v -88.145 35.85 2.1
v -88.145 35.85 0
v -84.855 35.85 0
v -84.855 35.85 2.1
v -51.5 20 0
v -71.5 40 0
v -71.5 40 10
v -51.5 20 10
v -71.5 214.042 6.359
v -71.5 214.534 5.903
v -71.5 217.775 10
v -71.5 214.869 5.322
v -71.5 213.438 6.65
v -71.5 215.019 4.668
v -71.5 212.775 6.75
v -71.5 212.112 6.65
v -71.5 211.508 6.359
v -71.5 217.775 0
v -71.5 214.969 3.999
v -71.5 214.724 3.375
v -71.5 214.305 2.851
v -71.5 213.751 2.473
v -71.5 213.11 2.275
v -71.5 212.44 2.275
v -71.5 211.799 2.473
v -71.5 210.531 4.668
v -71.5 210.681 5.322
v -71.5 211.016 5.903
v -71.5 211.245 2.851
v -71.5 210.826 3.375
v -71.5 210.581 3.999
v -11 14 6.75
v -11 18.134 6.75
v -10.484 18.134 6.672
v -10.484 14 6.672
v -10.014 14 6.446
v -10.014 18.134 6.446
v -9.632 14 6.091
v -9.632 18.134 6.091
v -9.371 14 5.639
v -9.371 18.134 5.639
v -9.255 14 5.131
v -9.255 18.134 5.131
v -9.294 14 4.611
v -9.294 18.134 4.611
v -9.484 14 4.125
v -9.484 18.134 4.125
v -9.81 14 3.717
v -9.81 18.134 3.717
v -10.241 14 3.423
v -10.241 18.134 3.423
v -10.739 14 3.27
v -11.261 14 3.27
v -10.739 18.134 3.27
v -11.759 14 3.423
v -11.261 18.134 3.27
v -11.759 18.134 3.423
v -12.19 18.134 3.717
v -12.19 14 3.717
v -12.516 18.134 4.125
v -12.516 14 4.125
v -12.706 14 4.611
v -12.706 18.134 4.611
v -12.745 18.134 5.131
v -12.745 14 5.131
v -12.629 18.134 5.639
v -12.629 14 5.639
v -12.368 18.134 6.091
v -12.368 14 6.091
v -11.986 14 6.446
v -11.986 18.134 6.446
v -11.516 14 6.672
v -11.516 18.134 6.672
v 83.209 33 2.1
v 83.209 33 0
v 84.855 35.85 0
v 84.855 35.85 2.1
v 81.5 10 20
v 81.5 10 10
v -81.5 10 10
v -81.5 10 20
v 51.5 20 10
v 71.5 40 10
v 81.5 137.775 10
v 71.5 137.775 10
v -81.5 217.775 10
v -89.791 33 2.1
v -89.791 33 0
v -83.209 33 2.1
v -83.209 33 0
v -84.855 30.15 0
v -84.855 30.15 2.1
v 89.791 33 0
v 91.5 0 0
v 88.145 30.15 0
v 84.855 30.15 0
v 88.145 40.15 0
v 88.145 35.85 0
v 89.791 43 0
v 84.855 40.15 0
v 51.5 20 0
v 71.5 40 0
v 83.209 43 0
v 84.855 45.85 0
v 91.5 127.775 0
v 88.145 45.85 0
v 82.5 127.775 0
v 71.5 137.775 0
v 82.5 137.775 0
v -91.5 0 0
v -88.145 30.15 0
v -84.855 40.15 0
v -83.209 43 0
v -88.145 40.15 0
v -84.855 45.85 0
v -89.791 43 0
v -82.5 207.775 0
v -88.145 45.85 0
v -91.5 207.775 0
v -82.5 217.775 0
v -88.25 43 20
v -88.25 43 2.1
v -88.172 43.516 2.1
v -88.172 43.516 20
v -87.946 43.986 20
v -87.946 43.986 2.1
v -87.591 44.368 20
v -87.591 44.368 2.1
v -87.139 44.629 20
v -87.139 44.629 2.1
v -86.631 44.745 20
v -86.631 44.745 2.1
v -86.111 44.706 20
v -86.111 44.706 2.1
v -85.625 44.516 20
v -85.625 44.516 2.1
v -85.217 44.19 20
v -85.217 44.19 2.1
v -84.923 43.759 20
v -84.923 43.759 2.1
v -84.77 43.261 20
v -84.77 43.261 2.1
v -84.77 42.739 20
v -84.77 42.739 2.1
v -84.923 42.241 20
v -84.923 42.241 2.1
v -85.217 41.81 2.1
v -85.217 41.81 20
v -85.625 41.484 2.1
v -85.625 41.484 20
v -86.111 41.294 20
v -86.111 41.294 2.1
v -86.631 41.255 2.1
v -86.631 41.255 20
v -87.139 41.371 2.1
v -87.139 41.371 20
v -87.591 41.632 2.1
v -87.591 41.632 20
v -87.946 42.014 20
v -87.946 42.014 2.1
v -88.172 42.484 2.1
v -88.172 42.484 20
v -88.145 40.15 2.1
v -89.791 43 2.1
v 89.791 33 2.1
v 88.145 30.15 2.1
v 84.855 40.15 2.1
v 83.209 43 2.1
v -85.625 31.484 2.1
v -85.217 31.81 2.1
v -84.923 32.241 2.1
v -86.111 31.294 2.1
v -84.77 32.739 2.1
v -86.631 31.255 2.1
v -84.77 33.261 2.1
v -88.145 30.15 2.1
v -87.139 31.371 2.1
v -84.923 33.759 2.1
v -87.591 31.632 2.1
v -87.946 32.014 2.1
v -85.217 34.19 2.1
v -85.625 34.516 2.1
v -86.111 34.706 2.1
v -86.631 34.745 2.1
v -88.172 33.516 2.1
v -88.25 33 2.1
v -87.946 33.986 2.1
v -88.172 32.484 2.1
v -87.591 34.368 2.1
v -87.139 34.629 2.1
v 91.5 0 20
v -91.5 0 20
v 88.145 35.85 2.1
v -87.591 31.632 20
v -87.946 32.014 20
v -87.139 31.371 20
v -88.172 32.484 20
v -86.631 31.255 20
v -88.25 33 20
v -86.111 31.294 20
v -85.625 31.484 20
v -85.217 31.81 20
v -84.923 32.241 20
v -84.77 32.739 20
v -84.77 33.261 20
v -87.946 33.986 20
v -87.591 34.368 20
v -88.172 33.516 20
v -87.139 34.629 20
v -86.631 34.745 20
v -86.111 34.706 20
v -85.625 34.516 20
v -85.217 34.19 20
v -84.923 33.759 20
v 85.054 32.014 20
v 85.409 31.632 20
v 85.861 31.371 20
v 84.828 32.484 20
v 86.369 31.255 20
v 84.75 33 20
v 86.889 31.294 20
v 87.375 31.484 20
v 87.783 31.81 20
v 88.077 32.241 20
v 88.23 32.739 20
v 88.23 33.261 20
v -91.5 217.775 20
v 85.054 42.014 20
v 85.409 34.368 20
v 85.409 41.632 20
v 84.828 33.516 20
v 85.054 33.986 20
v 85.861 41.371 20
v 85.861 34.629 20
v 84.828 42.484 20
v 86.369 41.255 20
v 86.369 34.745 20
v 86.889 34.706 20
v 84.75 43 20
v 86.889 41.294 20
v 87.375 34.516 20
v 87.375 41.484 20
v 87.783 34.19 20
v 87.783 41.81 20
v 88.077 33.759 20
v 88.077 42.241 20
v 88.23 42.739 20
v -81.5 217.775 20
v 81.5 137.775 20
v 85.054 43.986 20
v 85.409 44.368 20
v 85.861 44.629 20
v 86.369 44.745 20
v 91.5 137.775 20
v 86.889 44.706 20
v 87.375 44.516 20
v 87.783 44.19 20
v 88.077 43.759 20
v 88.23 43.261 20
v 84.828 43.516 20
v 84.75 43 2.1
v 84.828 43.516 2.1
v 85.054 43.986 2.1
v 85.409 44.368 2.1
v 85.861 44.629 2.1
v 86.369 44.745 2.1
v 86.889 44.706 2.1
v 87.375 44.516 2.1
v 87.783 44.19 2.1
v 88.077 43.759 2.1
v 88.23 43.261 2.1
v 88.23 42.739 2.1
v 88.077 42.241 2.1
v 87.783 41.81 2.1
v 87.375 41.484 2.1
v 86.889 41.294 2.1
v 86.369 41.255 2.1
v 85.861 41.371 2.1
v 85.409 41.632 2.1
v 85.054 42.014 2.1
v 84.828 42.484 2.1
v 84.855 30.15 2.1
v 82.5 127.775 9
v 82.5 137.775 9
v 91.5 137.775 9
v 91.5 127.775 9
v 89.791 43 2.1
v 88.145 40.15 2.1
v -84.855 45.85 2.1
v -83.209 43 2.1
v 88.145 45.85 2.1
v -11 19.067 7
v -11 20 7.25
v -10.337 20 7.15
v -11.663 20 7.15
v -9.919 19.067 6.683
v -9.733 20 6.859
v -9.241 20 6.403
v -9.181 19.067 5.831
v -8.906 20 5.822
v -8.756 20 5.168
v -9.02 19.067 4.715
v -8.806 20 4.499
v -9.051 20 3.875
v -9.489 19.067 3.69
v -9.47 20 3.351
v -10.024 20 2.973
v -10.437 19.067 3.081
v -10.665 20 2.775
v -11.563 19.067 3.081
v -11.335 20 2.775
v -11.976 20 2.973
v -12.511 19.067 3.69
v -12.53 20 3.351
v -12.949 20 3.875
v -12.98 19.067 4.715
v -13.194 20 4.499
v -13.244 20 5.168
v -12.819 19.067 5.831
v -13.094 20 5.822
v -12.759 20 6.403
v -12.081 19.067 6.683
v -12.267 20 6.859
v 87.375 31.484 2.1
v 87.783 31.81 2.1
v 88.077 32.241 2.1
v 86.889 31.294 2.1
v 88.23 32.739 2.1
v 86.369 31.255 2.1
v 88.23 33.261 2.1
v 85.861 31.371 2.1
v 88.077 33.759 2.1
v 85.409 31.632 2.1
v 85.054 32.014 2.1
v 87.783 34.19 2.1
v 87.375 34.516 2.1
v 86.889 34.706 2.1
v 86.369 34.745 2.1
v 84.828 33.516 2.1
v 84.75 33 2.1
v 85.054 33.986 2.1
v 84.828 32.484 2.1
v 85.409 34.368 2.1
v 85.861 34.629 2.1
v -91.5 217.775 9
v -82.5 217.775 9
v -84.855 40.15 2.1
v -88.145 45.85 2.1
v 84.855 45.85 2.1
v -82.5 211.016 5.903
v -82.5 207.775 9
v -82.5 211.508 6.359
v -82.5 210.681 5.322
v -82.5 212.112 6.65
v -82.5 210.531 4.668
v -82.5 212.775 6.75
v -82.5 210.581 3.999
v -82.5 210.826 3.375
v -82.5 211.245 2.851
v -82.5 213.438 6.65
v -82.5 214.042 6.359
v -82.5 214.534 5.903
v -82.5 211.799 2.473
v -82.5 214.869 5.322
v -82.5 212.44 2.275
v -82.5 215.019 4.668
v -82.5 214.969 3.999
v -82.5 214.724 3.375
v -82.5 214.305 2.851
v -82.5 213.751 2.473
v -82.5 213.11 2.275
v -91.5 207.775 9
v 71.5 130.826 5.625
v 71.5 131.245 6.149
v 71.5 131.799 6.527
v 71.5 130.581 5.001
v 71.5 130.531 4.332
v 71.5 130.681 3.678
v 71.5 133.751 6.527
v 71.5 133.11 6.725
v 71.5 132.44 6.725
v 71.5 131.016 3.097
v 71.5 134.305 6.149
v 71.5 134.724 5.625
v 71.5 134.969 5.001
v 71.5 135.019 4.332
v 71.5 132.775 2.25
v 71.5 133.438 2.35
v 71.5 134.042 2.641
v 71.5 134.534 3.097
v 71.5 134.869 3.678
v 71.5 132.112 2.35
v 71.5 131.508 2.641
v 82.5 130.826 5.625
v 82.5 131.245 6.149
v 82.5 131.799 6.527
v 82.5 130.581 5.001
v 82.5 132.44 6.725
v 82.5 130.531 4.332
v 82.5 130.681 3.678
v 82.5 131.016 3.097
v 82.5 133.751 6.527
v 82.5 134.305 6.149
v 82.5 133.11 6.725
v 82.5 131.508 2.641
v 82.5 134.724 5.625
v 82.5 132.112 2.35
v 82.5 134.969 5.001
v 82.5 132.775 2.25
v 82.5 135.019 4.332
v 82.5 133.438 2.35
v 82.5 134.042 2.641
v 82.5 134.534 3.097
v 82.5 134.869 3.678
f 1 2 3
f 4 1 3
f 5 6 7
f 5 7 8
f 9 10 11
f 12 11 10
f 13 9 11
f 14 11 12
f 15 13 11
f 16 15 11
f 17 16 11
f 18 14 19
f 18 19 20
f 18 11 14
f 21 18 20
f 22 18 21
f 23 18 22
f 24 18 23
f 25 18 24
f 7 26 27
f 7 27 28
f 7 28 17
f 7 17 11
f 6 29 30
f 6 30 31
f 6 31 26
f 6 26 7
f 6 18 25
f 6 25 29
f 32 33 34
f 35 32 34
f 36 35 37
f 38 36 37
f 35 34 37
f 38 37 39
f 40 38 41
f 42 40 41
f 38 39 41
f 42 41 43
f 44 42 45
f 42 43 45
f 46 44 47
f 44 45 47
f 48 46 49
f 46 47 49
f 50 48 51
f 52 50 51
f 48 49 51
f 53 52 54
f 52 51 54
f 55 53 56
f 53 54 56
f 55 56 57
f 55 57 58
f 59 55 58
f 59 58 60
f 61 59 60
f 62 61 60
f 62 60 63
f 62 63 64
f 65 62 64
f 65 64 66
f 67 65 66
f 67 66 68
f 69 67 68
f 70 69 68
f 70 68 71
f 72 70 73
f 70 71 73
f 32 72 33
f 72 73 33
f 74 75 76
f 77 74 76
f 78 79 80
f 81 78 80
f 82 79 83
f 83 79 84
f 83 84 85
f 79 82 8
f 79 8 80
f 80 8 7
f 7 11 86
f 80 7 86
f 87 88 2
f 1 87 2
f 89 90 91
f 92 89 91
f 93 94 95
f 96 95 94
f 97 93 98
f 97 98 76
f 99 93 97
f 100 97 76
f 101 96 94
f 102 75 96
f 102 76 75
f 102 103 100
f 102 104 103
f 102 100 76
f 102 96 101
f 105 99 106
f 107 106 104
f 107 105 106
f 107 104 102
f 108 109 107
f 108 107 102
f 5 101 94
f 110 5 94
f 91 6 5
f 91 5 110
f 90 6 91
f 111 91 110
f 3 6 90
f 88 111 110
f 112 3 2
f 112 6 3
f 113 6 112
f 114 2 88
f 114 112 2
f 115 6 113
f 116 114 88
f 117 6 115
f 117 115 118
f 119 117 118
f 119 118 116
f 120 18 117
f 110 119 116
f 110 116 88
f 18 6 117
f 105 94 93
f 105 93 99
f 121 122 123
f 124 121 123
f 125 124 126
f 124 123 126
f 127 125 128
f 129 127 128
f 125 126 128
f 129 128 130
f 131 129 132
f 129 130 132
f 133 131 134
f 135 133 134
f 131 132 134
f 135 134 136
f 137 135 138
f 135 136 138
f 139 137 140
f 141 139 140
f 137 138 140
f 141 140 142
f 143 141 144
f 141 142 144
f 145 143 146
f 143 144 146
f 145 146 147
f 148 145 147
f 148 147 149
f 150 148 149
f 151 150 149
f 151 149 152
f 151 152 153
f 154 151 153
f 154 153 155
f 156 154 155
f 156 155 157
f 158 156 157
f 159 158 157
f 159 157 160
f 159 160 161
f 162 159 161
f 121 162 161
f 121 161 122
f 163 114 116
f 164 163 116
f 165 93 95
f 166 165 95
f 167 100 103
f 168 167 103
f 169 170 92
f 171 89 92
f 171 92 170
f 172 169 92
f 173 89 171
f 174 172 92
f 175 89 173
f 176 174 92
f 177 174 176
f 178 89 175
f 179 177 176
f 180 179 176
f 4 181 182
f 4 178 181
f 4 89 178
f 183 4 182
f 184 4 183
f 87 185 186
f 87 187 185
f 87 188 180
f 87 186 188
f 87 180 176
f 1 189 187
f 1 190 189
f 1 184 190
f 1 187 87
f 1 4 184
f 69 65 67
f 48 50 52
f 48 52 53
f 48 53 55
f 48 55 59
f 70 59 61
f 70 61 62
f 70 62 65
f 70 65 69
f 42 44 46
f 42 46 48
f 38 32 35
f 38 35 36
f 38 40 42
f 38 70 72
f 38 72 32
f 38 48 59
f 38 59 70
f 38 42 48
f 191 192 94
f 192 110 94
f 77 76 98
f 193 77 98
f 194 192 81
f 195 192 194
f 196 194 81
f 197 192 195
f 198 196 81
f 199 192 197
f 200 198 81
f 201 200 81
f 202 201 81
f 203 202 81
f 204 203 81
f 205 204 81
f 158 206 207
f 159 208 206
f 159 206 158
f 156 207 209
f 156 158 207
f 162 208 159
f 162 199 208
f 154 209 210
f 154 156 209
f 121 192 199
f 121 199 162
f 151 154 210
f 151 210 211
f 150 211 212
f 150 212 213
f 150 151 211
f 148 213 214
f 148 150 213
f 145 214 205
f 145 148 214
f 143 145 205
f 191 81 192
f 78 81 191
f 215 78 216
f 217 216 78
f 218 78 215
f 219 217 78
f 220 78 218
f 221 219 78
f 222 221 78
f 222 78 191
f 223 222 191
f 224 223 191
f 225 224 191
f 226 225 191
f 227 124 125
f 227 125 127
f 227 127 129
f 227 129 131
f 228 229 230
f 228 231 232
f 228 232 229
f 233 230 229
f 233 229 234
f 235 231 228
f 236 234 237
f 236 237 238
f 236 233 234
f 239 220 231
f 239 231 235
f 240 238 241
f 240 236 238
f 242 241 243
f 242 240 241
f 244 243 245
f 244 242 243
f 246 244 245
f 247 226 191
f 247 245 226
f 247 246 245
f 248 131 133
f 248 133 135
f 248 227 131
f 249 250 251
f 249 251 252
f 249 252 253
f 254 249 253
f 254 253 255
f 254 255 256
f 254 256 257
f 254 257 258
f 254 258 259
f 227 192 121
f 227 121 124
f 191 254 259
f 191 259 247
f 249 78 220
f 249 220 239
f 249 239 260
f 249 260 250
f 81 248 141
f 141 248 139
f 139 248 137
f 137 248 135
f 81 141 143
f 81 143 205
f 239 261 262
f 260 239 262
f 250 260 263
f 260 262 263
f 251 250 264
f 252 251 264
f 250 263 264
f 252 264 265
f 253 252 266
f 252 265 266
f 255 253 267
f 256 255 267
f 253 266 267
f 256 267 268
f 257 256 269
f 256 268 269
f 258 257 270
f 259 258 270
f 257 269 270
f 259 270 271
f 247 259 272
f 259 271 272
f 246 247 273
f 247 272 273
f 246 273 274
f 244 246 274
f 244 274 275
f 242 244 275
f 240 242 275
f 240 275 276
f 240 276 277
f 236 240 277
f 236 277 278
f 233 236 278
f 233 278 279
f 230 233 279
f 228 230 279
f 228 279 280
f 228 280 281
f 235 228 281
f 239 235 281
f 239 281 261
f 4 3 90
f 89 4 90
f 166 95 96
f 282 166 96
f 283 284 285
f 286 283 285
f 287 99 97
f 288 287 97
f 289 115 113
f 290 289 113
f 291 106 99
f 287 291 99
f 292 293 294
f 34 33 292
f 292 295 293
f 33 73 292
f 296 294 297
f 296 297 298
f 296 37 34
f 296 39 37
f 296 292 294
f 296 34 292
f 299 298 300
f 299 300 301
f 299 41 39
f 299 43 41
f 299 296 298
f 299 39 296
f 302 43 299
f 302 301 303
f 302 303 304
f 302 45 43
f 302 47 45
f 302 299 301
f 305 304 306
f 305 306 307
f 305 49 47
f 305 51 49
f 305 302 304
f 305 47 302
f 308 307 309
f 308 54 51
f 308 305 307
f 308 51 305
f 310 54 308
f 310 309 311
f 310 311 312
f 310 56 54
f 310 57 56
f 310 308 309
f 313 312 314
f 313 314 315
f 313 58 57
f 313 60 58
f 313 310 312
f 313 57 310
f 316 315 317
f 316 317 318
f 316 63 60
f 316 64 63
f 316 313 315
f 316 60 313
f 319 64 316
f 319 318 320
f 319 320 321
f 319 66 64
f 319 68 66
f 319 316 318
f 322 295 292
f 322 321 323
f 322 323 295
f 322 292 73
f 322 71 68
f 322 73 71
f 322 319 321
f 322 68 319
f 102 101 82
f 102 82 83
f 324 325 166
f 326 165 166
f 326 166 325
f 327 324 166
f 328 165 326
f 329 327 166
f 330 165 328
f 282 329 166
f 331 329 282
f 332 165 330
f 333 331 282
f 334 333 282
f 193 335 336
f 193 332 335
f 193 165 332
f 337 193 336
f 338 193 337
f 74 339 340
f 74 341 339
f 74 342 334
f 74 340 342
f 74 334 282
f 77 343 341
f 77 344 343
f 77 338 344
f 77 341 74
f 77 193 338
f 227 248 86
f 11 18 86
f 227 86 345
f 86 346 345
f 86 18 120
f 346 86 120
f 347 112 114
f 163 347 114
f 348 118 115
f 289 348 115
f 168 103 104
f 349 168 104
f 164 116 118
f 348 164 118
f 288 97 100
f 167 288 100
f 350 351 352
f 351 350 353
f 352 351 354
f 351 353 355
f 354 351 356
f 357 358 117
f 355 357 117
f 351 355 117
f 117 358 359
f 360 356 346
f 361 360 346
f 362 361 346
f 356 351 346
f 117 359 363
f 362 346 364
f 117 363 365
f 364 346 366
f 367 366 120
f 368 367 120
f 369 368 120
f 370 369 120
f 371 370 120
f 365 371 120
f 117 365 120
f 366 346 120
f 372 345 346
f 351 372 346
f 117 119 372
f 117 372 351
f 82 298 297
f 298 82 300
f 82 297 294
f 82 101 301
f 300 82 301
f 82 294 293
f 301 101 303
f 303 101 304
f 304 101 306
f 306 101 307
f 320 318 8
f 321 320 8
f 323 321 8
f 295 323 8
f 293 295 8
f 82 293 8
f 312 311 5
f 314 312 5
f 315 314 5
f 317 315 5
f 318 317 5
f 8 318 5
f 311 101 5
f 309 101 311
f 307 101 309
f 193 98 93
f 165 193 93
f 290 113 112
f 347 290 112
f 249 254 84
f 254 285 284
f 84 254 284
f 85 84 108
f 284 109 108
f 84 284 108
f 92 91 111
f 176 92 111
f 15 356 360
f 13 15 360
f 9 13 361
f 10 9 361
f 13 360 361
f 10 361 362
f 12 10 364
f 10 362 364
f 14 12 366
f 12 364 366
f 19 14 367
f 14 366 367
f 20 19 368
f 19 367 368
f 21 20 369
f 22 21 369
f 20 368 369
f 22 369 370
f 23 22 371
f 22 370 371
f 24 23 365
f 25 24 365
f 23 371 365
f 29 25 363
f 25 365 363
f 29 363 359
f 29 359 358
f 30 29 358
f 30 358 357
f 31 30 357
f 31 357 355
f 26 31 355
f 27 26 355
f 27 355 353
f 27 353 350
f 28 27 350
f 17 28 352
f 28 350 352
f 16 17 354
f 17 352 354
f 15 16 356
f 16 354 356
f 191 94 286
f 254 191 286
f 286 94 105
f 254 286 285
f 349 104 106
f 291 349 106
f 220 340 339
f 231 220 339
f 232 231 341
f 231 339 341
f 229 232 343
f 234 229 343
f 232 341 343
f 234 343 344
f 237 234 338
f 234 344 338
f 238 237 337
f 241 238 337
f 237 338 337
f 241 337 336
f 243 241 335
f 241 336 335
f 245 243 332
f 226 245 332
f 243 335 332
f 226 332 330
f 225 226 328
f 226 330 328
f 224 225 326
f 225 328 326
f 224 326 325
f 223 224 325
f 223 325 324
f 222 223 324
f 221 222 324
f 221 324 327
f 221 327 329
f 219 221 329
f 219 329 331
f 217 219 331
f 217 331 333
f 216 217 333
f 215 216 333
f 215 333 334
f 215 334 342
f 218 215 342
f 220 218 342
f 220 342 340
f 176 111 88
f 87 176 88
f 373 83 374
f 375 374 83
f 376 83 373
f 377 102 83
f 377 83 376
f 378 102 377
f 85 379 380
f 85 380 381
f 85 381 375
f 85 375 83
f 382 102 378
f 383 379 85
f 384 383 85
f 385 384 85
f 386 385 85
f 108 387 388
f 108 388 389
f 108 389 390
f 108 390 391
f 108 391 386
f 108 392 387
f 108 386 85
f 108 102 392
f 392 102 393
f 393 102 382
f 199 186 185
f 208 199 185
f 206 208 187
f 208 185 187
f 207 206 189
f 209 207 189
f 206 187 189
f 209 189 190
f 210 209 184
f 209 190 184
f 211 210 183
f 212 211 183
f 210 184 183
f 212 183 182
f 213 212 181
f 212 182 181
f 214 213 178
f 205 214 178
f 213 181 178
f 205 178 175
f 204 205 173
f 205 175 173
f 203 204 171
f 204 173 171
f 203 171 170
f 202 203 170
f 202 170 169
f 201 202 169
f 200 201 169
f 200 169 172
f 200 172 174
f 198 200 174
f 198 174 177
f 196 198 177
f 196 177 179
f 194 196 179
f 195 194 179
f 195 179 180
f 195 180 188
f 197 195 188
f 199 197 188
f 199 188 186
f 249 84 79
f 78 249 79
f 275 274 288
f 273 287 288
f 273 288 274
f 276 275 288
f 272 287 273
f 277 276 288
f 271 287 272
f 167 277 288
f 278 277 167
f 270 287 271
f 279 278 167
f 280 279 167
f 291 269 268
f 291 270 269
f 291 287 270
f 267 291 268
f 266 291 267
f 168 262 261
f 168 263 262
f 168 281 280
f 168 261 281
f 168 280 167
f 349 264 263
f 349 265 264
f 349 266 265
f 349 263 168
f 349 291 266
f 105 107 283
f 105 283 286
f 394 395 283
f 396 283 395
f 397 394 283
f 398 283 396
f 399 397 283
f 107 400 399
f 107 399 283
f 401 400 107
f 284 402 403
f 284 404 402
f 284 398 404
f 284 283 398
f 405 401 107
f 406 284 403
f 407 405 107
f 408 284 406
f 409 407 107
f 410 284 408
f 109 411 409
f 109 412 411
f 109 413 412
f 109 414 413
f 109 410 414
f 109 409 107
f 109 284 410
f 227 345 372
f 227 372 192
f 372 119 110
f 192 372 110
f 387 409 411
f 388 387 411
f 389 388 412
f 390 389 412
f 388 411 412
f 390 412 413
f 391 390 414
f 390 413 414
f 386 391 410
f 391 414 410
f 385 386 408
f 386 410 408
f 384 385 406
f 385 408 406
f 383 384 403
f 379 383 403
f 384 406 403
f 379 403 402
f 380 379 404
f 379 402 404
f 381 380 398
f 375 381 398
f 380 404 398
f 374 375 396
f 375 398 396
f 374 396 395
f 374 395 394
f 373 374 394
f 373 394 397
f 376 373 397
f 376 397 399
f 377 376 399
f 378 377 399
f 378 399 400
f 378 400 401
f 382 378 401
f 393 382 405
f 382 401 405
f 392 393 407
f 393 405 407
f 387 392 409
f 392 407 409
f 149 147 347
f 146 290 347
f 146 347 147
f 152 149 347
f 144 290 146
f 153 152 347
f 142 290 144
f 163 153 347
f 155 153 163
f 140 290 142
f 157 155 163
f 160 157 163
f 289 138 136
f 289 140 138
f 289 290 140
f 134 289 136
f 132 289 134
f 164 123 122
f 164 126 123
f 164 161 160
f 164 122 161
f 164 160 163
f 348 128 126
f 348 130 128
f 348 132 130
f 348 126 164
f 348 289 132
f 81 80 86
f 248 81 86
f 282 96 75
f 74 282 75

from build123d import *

# Parameters (mm, degrees)
BOSS_EXTRUDE1_DEPTH = 10
BOSS_EXTRUDE2_DEPTH = 10
SKETCH3_W           = 9
SKETCH3_H           = 9
CUT_EXTRUDE2_DEPTH  = 10
SKETCH5_W           = 9
SKETCH5_H           = 9
CUT_EXTRUDE3_DEPTH  = 10
SKETCH6_R           = 2.25
CUT_EXTRUDE4_DEPTH  = 11
SKETCH7_R           = 2.25
CUT_EXTRUDE5_DEPTH  = 11
SKETCH8_R           = 1.75
CUT_EXTRUDE6_DEPTH  = 238.06159669
SKETCH9_R           = 1.75
CUT_EXTRUDE7_DEPTH  = 6
CHAMFER1_SIZE       = 0.5
CHAMFER1_SIZE2      = 1.866025404
CUT_EXTRUDE8_DEPTH  = 2.1


with BuildPart() as part:
    # Sketch1 → Boss-Extrude1 (new body)
    with BuildSketch(Plane.XY):
        Polygon((0, 0), (-91.5, 0), (-91.5, 217.775), (-71.5, 217.775), (-71.5, 40), (-51.5, 20), (0, 20), (51.5, 20), (71.5, 40), (71.5, 137.775), (91.5, 137.775), (91.5, 0), align=None)
    extrude(amount=BOSS_EXTRUDE1_DEPTH)

    # Sketch2 → Boss-Extrude2 (add)
    with BuildSketch(Plane.XY.offset(10)):
        Polygon((-81.5, 217.775), (-91.5, 217.775), (-91.5, 0), (91.5, 0), (91.5, 137.775), (81.5, 137.775), (81.5, 10), (-81.5, 10), align=None)
    extrude(amount=BOSS_EXTRUDE2_DEPTH)

    # Sketch3 → Cut-Extrude2 (cut)
    with BuildSketch(Plane(origin=(0, 217.775, 0), x_dir=(1, 0, 0), z_dir=(0, 1, 0))):
        with Locations((-87, -4.5)):
            Rectangle(SKETCH3_W, SKETCH3_H)
    extrude(amount=-CUT_EXTRUDE2_DEPTH, mode=Mode.SUBTRACT)

    # Sketch5 → Cut-Extrude3 (cut)
    with BuildSketch(Plane(origin=(0, 137.775, 0), x_dir=(1, 0, 0), z_dir=(0, 1, 0))):
        with Locations((87, -4.5)):
            Rectangle(SKETCH5_W, SKETCH5_H)
    extrude(amount=-CUT_EXTRUDE3_DEPTH, mode=Mode.SUBTRACT)

    # Sketch6 → Cut-Extrude4 (cut)
    with BuildSketch(Plane.ZY.offset(82.5)):
        with Locations((4.5, 212.775)):
            Circle(SKETCH6_R)
    extrude(amount=-CUT_EXTRUDE4_DEPTH, mode=Mode.SUBTRACT)

    # Sketch7 → Cut-Extrude5 (cut)
    with BuildSketch(Plane(origin=(82.5, 0, 0), x_dir=(0, 0, -1), z_dir=(1, 0, 0))):
        with Locations((-4.5, 132.775)):
            Circle(SKETCH7_R)
    extrude(amount=-CUT_EXTRUDE5_DEPTH, mode=Mode.SUBTRACT)

    # Sketch8 → Cut-Extrude6 (cut, through all)
    with BuildSketch(Plane(origin=(0, 0, 0), x_dir=(-1, 0, 0), z_dir=(0, 0, -1))):
        with Locations((86.5, 33)):
            Circle(SKETCH8_R)
        with Locations((-86.5, 33)):
            Circle(SKETCH8_R)
        with Locations((-86.5, 43)):
            Circle(SKETCH8_R)
        with Locations((86.5, 43)):
            Circle(SKETCH8_R)
    extrude(amount=-CUT_EXTRUDE6_DEPTH, mode=Mode.SUBTRACT)

    # Sketch9 → Cut-Extrude7 (cut)
    with BuildSketch(Plane(origin=(0, 20, 0), x_dir=(1, 0, 0), z_dir=(0, 1, 0))):
        with Locations(Location((-11, -5, 0), (0, 0, 270))):
            Circle(SKETCH9_R)
    extrude(amount=-CUT_EXTRUDE7_DEPTH, mode=Mode.SUBTRACT)

    # Chamfer1
    chamfer1_edges = [part.edges().sort_by_distance(p)[0] for p in [
        (-11, 20, 3.25),
    ]]
    chamfer1_side = [part.faces().sort_by_distance(p)[0] for p in [
        (0.103718732, 20, 5),
    ]]
    chamfer(chamfer1_edges, length=CHAMFER1_SIZE, length2=CHAMFER1_SIZE2, reference=chamfer1_side[0])

    # Sketch10 → Cut-Extrude8 (cut)
    with BuildSketch(Plane(origin=(0, 0, 0), x_dir=(-1, 0, 0), z_dir=(0, 0, -1))):
        Polygon((-84.854551733, 30.15), (-83.209103466, 33), (-84.854551733, 35.85), (-88.145448267, 35.85), (-89.790896534, 33), (-88.145448267, 30.15), align=None)
        Polygon((88.145448267, 30.15), (89.790896534, 33), (88.145448267, 35.85), (84.854551733, 35.85), (83.209103466, 33), (84.854551733, 30.15), align=None)
        Polygon((-84.854551733, 40.15), (-83.209103466, 43), (-84.854551733, 45.85), (-88.145448267, 45.85), (-89.790896534, 43), (-88.145448267, 40.15), align=None)
        Polygon((88.145448267, 40.15), (89.790896534, 43), (88.145448267, 45.85), (84.854551733, 45.85), (83.209103466, 43), (84.854551733, 40.15), align=None)
    extrude(amount=-CUT_EXTRUDE8_DEPTH, mode=Mode.SUBTRACT)


solid = part.part
